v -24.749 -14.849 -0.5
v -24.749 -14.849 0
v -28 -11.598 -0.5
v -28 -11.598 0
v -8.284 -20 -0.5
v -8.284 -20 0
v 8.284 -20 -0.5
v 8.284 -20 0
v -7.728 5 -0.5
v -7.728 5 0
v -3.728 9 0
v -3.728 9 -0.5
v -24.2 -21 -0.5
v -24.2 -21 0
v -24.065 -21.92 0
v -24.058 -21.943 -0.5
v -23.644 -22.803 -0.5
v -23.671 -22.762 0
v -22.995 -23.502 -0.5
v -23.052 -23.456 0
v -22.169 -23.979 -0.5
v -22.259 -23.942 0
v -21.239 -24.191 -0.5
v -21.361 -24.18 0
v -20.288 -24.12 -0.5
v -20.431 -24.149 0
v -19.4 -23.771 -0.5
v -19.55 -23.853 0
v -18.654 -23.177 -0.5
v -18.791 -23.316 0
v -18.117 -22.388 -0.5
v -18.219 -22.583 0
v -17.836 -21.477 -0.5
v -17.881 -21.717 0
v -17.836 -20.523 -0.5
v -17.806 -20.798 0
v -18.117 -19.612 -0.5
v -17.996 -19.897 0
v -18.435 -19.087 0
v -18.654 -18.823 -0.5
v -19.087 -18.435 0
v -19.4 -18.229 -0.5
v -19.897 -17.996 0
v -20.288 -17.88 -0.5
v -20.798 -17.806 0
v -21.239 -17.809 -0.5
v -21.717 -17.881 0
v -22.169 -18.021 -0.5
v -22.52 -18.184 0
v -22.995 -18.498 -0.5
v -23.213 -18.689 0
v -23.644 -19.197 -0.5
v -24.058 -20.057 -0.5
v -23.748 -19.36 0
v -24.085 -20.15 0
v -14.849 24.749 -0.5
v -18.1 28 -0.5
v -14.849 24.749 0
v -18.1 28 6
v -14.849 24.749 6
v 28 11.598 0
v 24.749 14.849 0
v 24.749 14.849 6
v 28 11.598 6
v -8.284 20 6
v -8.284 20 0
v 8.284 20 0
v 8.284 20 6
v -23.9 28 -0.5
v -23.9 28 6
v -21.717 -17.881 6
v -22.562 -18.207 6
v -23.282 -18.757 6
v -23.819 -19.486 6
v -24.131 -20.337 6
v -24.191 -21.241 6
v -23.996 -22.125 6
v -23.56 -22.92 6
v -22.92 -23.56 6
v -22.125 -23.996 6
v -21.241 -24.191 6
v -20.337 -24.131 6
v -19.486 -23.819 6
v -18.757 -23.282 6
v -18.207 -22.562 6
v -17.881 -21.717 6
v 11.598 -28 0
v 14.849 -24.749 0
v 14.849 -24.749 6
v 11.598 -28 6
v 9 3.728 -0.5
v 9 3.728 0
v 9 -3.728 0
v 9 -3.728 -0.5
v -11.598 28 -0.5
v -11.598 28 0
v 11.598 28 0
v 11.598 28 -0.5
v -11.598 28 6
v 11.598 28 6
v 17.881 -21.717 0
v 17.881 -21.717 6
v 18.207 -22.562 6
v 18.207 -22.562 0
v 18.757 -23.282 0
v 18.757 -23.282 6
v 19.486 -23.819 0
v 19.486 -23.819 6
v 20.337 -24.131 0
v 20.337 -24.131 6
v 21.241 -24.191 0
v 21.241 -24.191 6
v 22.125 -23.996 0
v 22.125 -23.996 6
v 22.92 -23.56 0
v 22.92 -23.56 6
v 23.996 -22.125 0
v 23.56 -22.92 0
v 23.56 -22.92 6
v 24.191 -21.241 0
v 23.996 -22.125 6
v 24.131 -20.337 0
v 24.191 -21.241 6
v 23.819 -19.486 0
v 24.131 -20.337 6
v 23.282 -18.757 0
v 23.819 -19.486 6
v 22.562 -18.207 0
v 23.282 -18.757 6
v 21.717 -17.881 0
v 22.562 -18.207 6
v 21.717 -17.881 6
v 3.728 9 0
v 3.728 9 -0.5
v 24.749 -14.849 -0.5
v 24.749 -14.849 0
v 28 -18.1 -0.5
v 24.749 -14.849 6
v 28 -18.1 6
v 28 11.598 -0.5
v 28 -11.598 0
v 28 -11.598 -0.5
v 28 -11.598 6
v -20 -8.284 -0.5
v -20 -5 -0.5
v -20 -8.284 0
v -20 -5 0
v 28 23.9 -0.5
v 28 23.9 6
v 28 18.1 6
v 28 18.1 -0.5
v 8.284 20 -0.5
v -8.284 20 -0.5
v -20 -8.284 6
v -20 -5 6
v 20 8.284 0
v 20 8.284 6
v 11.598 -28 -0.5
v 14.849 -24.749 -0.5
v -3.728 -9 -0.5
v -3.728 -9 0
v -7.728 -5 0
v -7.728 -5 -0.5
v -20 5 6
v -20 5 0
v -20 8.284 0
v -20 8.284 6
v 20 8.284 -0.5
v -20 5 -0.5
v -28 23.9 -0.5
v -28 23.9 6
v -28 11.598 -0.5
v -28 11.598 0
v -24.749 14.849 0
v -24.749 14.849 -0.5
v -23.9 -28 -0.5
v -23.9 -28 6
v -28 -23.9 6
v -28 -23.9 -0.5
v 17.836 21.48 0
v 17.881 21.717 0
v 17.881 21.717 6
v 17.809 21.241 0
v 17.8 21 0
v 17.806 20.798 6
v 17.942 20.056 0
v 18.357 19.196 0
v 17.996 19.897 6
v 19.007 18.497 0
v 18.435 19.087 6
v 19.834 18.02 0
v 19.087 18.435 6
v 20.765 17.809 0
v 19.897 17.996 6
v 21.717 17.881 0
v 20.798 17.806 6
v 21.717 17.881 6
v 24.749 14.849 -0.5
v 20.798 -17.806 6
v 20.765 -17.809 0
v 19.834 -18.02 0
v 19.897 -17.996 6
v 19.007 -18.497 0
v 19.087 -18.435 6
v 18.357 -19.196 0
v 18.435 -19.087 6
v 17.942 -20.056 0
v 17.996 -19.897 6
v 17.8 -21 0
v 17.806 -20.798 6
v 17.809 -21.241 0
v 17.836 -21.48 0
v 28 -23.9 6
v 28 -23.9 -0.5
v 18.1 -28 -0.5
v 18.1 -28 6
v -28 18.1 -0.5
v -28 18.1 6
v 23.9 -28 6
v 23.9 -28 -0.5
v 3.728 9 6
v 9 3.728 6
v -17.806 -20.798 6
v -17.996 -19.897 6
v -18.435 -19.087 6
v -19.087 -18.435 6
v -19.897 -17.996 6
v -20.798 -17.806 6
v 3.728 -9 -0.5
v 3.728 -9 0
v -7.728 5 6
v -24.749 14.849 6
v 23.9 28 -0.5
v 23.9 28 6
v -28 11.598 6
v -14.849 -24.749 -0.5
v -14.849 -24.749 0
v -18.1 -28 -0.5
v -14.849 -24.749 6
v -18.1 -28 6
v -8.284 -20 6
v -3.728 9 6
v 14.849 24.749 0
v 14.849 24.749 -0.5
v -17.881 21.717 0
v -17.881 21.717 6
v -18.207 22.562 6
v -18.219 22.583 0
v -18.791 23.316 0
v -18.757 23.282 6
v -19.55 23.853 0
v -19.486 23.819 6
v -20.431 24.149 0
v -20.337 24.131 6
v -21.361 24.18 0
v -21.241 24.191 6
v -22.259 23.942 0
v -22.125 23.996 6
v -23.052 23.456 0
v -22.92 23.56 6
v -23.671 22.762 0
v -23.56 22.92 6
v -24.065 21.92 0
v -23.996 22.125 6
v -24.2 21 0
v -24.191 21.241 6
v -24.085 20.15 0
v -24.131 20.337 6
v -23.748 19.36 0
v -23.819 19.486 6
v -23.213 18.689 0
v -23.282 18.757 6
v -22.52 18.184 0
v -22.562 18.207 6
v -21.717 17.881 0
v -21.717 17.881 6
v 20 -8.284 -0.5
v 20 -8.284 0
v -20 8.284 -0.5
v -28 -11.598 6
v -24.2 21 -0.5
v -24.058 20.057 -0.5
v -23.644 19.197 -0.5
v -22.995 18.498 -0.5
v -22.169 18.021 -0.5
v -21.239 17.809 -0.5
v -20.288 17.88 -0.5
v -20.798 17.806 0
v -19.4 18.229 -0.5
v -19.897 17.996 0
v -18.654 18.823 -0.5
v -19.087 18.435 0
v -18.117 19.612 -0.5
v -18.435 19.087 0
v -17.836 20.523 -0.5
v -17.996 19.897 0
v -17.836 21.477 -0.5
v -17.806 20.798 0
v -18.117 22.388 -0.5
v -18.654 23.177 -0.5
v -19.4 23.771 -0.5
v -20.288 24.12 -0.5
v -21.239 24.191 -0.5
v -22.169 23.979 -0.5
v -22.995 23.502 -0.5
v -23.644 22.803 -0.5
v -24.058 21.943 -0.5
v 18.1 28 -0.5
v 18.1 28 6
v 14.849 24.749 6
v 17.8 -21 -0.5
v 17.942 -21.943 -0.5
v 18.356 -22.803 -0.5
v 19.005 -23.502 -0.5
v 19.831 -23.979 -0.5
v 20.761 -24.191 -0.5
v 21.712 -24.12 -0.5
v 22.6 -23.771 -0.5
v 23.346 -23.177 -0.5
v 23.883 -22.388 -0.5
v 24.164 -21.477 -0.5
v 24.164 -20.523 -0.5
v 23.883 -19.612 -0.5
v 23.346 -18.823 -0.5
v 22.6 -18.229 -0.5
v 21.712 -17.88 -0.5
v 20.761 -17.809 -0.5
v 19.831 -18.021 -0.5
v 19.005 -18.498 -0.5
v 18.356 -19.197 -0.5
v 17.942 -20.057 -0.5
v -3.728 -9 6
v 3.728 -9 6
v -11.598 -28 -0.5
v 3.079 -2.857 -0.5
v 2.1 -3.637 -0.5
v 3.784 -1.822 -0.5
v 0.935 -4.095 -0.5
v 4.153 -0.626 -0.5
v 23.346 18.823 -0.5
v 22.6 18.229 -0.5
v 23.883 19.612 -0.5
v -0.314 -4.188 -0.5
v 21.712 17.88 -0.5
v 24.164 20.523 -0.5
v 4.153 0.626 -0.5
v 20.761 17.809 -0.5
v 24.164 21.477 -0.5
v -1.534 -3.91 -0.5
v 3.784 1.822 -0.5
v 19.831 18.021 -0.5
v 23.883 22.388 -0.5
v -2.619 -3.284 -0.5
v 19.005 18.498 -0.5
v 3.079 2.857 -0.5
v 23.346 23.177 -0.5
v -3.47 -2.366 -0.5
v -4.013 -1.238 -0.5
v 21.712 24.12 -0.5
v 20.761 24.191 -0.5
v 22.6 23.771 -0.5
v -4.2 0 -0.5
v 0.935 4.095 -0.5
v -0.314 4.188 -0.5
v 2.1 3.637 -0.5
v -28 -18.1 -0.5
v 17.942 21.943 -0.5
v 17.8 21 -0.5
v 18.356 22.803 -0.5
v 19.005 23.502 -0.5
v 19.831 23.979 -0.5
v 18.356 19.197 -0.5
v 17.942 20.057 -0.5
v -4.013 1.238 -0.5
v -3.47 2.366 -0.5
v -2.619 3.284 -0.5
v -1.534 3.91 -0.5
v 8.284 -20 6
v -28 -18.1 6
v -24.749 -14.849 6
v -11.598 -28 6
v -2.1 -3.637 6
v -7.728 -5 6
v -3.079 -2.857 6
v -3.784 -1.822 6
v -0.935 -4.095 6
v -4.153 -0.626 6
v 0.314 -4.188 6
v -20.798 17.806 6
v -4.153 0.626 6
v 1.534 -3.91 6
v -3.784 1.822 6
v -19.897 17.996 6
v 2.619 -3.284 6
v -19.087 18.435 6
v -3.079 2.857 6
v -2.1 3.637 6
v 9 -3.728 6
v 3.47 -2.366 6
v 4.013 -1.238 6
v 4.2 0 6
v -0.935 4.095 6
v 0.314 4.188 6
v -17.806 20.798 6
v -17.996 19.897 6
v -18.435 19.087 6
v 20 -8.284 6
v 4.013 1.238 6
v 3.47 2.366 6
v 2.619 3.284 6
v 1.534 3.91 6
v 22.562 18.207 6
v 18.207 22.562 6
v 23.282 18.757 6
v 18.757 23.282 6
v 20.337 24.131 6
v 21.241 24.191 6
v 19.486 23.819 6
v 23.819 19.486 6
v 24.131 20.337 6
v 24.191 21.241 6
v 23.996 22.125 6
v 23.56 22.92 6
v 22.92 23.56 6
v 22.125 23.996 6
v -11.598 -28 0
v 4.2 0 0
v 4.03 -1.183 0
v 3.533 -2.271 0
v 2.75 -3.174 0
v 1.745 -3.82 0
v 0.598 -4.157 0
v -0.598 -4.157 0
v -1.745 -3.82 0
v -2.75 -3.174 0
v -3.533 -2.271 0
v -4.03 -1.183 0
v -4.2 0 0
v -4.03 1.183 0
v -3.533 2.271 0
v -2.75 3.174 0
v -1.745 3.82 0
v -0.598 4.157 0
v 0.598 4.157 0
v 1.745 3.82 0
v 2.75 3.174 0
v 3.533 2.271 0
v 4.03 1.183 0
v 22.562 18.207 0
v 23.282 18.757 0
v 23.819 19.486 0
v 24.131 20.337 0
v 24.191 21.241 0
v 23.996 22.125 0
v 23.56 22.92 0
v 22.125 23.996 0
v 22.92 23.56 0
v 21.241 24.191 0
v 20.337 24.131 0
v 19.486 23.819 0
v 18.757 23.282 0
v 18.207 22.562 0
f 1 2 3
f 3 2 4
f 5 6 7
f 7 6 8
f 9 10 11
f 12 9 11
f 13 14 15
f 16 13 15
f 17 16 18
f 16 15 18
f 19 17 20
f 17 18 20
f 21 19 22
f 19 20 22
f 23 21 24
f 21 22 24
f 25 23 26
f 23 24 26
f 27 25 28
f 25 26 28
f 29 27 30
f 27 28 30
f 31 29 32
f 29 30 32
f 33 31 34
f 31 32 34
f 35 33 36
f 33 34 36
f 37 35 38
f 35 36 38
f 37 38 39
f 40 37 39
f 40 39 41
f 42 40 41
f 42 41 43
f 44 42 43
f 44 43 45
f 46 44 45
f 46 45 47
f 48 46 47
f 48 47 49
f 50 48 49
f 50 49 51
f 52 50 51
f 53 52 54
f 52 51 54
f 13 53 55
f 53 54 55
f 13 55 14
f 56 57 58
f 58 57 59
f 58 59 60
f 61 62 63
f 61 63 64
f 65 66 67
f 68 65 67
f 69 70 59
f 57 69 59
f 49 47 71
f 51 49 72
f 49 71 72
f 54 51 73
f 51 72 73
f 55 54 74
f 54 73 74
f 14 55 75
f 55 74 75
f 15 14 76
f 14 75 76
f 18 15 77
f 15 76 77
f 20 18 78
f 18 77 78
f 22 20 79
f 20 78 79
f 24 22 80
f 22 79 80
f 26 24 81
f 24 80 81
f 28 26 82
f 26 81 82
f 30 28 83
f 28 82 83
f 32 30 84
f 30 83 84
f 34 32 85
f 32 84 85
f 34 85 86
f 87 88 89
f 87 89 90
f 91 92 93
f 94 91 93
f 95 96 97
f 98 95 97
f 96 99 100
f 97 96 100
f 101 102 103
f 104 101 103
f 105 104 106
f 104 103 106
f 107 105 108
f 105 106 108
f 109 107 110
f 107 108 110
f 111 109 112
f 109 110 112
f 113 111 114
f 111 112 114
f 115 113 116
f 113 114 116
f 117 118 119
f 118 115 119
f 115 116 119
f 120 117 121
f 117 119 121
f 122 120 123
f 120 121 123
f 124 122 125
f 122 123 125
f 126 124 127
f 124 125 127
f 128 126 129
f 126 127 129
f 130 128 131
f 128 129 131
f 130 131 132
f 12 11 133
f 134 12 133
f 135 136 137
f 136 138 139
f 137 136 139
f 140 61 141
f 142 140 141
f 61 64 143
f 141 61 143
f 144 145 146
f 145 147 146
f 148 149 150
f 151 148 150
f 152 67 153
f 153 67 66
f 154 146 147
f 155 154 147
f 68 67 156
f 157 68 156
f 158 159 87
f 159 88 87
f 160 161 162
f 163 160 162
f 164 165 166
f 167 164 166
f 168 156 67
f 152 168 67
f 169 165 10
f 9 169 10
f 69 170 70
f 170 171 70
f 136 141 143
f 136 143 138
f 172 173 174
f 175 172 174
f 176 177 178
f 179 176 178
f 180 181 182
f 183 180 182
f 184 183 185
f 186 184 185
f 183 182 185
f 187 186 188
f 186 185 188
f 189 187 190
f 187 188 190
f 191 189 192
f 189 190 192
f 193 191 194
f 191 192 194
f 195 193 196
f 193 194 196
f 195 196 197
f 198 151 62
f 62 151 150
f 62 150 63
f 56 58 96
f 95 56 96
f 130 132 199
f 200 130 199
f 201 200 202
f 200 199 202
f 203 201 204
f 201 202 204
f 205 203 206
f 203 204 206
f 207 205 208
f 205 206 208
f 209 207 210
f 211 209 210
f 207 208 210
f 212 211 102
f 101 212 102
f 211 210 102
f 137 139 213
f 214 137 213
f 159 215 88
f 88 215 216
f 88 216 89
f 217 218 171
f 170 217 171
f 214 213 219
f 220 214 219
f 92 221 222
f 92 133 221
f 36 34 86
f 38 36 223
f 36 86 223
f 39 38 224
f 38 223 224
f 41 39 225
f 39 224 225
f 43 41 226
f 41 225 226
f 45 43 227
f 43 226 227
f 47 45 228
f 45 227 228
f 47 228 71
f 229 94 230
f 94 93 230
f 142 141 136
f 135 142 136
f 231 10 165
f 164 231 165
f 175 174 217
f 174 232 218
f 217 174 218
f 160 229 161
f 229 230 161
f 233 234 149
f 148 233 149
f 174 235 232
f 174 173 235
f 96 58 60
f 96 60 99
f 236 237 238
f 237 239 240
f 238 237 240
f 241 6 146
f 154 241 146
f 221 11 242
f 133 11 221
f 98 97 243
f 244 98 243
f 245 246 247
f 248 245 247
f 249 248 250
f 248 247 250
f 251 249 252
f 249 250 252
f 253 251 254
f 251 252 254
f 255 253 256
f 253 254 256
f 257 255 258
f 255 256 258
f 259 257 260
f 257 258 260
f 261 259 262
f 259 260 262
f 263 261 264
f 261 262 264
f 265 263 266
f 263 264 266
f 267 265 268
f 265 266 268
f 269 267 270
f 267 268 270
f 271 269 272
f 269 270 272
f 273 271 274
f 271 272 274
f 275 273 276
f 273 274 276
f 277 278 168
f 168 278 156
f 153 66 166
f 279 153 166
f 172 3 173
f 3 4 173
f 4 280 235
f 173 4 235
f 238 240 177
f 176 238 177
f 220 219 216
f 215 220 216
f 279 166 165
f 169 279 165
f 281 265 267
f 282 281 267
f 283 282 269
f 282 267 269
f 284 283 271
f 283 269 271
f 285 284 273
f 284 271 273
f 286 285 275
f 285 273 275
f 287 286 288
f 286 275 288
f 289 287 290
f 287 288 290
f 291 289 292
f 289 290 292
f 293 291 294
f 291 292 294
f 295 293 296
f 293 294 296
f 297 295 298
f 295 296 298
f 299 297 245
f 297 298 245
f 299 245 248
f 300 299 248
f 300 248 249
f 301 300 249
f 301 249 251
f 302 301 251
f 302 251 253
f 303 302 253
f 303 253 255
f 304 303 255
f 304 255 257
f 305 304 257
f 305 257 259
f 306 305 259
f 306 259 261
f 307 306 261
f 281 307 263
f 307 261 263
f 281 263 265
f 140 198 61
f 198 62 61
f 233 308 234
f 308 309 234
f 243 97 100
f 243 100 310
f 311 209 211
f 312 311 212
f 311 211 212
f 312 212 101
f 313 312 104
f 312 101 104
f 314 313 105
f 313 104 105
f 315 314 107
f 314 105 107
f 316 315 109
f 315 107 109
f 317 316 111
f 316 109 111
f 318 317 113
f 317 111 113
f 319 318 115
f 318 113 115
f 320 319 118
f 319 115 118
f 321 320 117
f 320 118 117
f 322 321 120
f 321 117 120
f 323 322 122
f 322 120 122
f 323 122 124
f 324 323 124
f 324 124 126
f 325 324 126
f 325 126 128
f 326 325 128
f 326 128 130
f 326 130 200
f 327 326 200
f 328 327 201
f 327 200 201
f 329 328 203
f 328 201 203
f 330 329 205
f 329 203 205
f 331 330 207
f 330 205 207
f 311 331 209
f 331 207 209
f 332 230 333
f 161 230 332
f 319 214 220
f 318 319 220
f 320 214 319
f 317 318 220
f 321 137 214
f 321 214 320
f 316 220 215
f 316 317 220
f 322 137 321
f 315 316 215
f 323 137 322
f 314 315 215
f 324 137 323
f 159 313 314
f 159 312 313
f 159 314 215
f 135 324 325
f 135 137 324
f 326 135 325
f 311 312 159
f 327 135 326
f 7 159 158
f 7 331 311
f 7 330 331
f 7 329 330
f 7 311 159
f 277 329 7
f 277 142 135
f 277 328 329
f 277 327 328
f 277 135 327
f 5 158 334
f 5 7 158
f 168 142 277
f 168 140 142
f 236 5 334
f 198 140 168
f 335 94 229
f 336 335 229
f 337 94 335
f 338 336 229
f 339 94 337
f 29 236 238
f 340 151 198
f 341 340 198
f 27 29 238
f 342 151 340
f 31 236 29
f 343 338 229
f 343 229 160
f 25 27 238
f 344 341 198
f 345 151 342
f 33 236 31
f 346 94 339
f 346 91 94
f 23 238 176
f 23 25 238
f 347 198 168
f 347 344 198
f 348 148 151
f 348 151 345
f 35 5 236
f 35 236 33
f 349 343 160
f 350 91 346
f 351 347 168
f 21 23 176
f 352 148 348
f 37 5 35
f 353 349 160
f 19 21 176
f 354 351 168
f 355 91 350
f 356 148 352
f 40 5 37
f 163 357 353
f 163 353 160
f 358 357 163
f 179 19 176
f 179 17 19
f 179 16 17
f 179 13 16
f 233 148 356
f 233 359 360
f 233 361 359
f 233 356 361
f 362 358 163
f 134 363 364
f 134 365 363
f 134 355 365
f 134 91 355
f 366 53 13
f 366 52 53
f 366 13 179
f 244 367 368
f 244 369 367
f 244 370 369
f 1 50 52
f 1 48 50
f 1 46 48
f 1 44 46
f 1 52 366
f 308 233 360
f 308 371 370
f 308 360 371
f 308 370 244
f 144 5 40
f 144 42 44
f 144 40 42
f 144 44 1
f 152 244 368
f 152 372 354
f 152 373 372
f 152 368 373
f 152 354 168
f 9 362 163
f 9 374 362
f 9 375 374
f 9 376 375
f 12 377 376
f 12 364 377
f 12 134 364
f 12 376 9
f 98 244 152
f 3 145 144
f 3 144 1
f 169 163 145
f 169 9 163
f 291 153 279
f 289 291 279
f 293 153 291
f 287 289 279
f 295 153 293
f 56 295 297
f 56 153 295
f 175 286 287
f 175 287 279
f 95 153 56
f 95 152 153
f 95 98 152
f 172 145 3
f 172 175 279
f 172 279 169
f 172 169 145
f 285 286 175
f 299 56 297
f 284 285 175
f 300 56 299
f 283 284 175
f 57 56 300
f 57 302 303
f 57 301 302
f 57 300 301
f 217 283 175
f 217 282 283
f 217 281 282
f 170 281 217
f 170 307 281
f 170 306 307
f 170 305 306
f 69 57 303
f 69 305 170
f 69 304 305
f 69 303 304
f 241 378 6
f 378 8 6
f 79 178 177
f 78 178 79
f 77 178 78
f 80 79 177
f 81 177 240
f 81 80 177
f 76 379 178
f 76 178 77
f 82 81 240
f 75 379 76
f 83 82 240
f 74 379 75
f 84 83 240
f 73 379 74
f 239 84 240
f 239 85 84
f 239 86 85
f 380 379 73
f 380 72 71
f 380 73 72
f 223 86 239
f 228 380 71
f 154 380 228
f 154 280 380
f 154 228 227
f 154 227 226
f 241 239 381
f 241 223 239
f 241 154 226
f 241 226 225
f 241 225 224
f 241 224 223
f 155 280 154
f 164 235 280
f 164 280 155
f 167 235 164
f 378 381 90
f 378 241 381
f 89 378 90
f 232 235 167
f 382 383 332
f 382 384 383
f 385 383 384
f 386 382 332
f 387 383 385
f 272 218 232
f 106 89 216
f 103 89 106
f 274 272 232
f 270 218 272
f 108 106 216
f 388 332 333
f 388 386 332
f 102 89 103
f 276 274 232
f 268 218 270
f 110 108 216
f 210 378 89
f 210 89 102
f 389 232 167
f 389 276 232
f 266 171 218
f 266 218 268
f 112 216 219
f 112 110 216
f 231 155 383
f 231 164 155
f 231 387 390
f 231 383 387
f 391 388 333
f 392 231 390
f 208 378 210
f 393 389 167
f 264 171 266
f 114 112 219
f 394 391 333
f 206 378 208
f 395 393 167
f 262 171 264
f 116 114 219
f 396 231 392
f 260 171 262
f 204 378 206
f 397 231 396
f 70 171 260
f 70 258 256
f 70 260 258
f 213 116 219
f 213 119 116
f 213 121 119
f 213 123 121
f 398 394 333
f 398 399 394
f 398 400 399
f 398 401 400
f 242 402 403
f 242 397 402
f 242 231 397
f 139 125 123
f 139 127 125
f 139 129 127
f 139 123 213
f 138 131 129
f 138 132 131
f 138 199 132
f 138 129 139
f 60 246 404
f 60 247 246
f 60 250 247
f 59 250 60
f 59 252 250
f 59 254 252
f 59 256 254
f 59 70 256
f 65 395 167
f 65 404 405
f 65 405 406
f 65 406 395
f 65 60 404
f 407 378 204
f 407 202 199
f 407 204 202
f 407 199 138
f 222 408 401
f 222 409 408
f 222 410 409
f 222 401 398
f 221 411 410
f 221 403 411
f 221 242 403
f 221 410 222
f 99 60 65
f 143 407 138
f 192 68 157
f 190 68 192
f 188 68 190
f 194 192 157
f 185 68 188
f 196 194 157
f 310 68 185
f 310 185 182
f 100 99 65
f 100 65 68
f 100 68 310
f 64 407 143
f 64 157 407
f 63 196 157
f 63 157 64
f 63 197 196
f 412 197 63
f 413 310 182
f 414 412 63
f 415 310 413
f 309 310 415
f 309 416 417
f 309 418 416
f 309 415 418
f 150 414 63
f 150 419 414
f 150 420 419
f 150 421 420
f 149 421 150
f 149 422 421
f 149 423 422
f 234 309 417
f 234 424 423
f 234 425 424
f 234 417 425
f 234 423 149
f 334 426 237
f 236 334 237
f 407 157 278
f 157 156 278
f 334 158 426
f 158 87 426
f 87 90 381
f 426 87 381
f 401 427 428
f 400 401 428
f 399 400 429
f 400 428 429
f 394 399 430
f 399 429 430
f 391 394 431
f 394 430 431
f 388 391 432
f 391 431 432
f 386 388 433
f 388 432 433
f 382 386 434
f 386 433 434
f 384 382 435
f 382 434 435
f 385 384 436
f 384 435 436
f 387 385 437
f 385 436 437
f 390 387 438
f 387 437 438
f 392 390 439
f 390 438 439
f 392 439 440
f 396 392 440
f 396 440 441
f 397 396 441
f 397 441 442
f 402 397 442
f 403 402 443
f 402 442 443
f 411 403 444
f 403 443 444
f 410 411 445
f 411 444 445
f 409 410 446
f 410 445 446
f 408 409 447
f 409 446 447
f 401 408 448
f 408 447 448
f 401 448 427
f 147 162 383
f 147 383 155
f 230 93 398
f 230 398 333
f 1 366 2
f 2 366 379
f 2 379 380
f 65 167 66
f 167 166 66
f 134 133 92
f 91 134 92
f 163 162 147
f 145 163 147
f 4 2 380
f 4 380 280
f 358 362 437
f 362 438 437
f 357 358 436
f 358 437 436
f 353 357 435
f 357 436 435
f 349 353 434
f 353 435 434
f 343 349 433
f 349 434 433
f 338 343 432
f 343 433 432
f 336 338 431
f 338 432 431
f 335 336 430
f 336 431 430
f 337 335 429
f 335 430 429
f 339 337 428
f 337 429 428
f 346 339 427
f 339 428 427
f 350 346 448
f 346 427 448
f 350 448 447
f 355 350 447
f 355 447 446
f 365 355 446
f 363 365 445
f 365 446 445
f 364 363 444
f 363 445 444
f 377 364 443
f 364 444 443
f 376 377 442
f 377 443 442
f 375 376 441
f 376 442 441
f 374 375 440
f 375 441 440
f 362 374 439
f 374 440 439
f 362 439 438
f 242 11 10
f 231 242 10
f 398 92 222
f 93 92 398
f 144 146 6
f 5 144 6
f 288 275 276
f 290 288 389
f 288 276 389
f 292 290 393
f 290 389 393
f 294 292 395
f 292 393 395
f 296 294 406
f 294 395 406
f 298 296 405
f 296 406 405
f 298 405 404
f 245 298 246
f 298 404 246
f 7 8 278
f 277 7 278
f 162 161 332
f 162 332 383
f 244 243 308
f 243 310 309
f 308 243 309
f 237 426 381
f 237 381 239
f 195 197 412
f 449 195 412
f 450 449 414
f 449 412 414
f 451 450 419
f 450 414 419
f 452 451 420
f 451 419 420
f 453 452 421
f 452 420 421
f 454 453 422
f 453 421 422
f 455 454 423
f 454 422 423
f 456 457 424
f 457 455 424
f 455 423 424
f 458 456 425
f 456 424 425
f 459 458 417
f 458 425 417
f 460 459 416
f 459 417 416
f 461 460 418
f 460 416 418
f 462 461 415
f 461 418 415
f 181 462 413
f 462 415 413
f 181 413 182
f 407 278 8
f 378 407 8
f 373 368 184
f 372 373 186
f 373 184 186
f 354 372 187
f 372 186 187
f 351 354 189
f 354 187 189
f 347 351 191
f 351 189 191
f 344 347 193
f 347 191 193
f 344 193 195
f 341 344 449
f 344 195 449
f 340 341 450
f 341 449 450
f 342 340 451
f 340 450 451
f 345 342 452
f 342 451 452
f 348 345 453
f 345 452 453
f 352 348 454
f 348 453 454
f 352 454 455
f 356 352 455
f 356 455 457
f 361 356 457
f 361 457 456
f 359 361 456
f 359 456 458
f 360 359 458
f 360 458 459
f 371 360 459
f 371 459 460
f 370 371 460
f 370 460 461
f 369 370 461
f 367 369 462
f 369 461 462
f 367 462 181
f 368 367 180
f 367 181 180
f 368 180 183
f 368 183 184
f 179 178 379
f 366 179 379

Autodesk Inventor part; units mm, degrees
ref_plane "YZ Plane" through (0, 0, 0) normal (1, 0, 0) x (0, 1, 0)
ref_plane "XZ Plane" through (0, 0, 0) normal (0, 1, 0) x (-1, 0, 0)
ref_plane "XY Plane" through (0, 0, 0) normal (0, 0, 1) x (1, 0, 0)
sketch "Sketch1" plane through (0, 0, 0) normal (0, 0, 1) x (1, 0, 0)
  circle A0 centre (0, 0) radius 8 construction
  circle A1 centre (0, 0) radius 16 construction
  line L0 (20, -8.2843) -> (8.2843, -20)
  line L1 (8.2843, -20) -> (-8.2843, -20)
  line L2 (-8.2843, -20) -> (-20, -8.2843)
  line L3 (-20, 8.2843) -> (-8.2843, 20)
  line L4 (-8.2843, 20) -> (8.2843, 20)
  line L5 (8.2843, 20) -> (20, 8.2843)
  line L6 (20, 8.2843) -> (20, -8.2843)
  line L7 (-7.7279, 5) -> (-20, 5)
  line L8 (-7.7279, -5) -> (-20, -5)
  circle A2 centre (0, 0) radius 4.2
  line L9 (-20, -8.2843) -> (-20, -5)
  line L10 (-20, 5) -> (-20, 8.2843)
  line L11 (28, -11.598) -> (11.598, -28)
  line L12 (11.598, -28) -> (-11.598, -28)
  line L13 (-11.598, -28) -> (-28, -11.598)
  line L14 (-28, -11.598) -> (-28, 11.598)
  line L15 (-28, 11.598) -> (-11.598, 28)
  line L16 (-11.598, 28) -> (11.598, 28)
  line L17 (11.598, 28) -> (28, 11.598)
  line L18 (28, 11.598) -> (28, -11.598)
  line L19 (9, -3.7279) -> (3.7279, -9)
  line L20 (3.7279, -9) -> (-3.7279, -9)
  line L21 (-3.7279, 9) -> (3.7279, 9)
  line L22 (3.7279, 9) -> (9, 3.7279)
  line L23 (9, 3.7279) -> (9, -3.7279)
  line L24 (-20, 5) -> (-20, -5) construction
  line L25 (-3.7279, 9) -> (-7.7279, 5)
  line L26 (-3.7279, -9) -> (-7.7279, -5)
  point P0 (-20, 0)
  dimension "d1" = 16
  dimension "d2" = 32
  dimension "d5" = 8.4
  dimension "d6" = 40
  dimension "d7" = 8
  dimension "d8" = 10
  dimension "d10" = 18
extrude "Extrusion1" add sketch "Sketch1" along normal blind 6
sketch "Sketch2" plane through (0, 0, 6) normal (0, 0, 1) x (1, 0, 0)
  circle A0 centre (0, 0) radius 4.2 projected
  line L0 (11.598, 28) -> (-11.598, 28) projected
  line L1 (-11.598, 28) -> (-28, 11.598) projected
  line L2 (-28, 11.598) -> (-28, -11.598) projected
  line L3 (-28, -11.598) -> (-11.598, -28) projected
  line L4 (-11.598, -28) -> (11.598, -28) projected
  line L5 (-24.7487, 14.8492) -> (-28, 18.1005)
  line L6 (-28, 18.1005) -> (-28, 23.8995)
  line L7 (-28, 23.8995) -> (-23.8995, 28)
  line L8 (-23.8995, 28) -> (-18.1005, 28)
  line L9 (-18.1005, 28) -> (-14.8492, 24.7487)
  line L10 (-28, 21) -> (-21, 21) construction
  line L11 (-21, 28) -> (-21, 21) construction
  circle A1 centre (-21, 21) radius 3.2
  line L12 (-24.7487, 14.8492) -> (-14.8492, 24.7487)
  line L13 (-14.8492, -24.7487) -> (-18.1005, -28)
  line L14 (-18.1005, -28) -> (-23.8995, -28)
  line L15 (-23.8995, -28) -> (-28, -23.8995)
  line L16 (-28, -23.8995) -> (-28, -18.1005)
  line L17 (-28, -18.1005) -> (-24.7487, -14.8492)
  circle A2 centre (-21, -21) radius 3.2
  line L18 (-14.8492, -24.7487) -> (-24.7487, -14.8492)
  line L19 (24.7487, -14.8492) -> (28, -18.1005)
  line L20 (28, -18.1005) -> (28, -23.8995)
  line L21 (28, -23.8995) -> (23.8995, -28)
  line L22 (23.8995, -28) -> (18.1005, -28)
  line L23 (18.1005, -28) -> (14.8492, -24.7487)
  circle A3 centre (21, -21) radius 3.2
  line L24 (24.7487, -14.8492) -> (14.8492, -24.7487)
  line L25 (14.8492, 24.7487) -> (18.1005, 28)
  line L26 (18.1005, 28) -> (23.8995, 28)
  line L27 (23.8995, 28) -> (28, 23.8995)
  line L28 (28, 23.8995) -> (28, 18.1005)
  line L29 (28, 18.1005) -> (24.7487, 14.8492)
  circle A4 centre (21, 21) radius 3.2
  line L30 (14.8492, 24.7487) -> (24.7487, 14.8492)
  circle A5 centre (-21, 21) radius 6 construction
  point P0 (-19.799, 19.799)
  point P1 (-21, -28)
  point P2 (-28, -21)
  point P3 (28, -21)
  point P4 (21, -28)
  point P5 (21, 28)
  point P6 (28, 21)
  dimension "d13" = 14
  dimension "d14" = 7
  dimension "d15" = 6.4
  dimension "d18" = 360
  dimension "d22" = 12
extrude "Extrusion2" add sketch "Sketch2" against normal blind 6 contours L3 A2 L13 L14 L15 L16 L17 | L5 L6 L7 L8 L9 L1 A1 | L19 L20 L21 L22 L23 L24 A3 | L25 L26 L27 L28 L29 L30 A4
sketch "Sketch3" plane through (0, 0, 6) normal (0, 0, 1) x (1, 0, 0)
  line L0 (-17.8813, 21.7167) -> (-21.7167, 17.8813) projected
  arc A0 (-17.8813, 21.7167) -> (-21.7167, 17.8813) centre (-21, 21) ccw projected
  line L1 (-21.7167, -17.8813) -> (-17.8813, -21.7167) projected
  arc A1 (-21.7167, -17.8813) -> (-17.8813, -21.7167) centre (-21, -21) ccw projected
  arc A2 (17.8813, -21.7167) -> (21.7167, -17.8813) centre (21, -21) ccw projected
  line L2 (17.8813, -21.7167) -> (21.7167, -17.8813) projected
  arc A3 (21.7167, 17.8813) -> (17.8813, 21.7167) centre (21, 21) ccw projected
  line L3 (21.7167, 17.8813) -> (17.8813, 21.7167) projected
  circle A4 centre (-21, -21) radius 3.2
  circle A5 centre (-21, 21) radius 3.2
  circle A6 centre (21, 21) radius 3.2
  circle A7 centre (21, -21) radius 3.2
extrude "Extrusion3" cut sketch "Sketch3" against normal through all contours A5 L0 | A4 L1 | A7 L2 | A6 L3
sketch "Sketch4" plane through (0, 0, 0) normal (0, 0, -1) x (-1, 0, 0)
  circle A0 centre (21, -21) radius 3.2 projected
  circle A1 centre (21, 21) radius 3.2 projected
  circle A2 centre (-21, -21) radius 3.2 projected
  line L0 (-24.7487, -14.8492) -> (-28, -18.1005) projected
  line L1 (-28, -18.1005) -> (-28, -23.8995) projected
  line L2 (-28, -23.8995) -> (-23.8995, -28) projected
  line L3 (-23.8995, -28) -> (-18.1005, -28) projected
  line L4 (-18.1005, -28) -> (-14.8492, -24.7487) projected
  line L5 (-14.8492, -24.7487) -> (-11.598, -28) projected
  line L6 (-11.598, -28) -> (11.598, -28) projected
  line L7 (11.598, -28) -> (14.8492, -24.7487) projected
  line L8 (14.8492, -24.7487) -> (18.1005, -28) projected
  line L9 (18.1005, -28) -> (23.8995, -28) projected
  line L10 (23.8995, -28) -> (28, -23.8995) projected
  line L11 (28, -23.8995) -> (28, -18.1005) projected
  line L12 (28, -18.1005) -> (24.7487, -14.8492) projected
  line L13 (24.7487, -14.8492) -> (28, -11.598) projected
  line L14 (28, -11.598) -> (28, 11.598) projected
  line L15 (28, 11.598) -> (24.7487, 14.8492) projected
  line L16 (24.7487, 14.8492) -> (28, 18.1005) projected
  line L17 (28, 18.1005) -> (28, 23.8995) projected
  line L18 (28, 23.8995) -> (23.8995, 28) projected
  line L19 (23.8995, 28) -> (18.1005, 28) projected
  line L20 (18.1005, 28) -> (14.8492, 24.7487) projected
  line L21 (14.8492, 24.7487) -> (11.598, 28) projected
  line L22 (11.598, 28) -> (-11.598, 28) projected
  line L23 (-11.598, 28) -> (-14.8492, 24.7487) projected
  line L24 (-14.8492, 24.7487) -> (-18.1005, 28) projected
  line L25 (-18.1005, 28) -> (-23.8995, 28) projected
  line L26 (-23.8995, 28) -> (-28, 23.8995) projected
  line L27 (-28, 23.8995) -> (-28, 18.1005) projected
  line L28 (-28, 18.1005) -> (-24.7487, 14.8492) projected
  line L29 (-24.7487, 14.8492) -> (-28, 11.598) projected
  line L30 (-28, 11.598) -> (-28, -11.598) projected
  line L31 (-28, -11.598) -> (-24.7487, -14.8492) projected
  circle A3 centre (-21, 21) radius 3.2 projected
  line L32 (8.2843, -20) -> (-8.2843, -20) projected
  line L33 (-8.2843, -20) -> (-20, -8.2843) projected
  line L34 (-20, -8.2843) -> (-20, 8.2843) projected
  line L35 (-20, 8.2843) -> (-8.2843, 20) projected
  line L36 (-8.2843, 20) -> (8.2843, 20) projected
  line L37 (8.2843, 20) -> (20, 8.2843) projected
  line L38 (20, 8.2843) -> (20, 5) projected
  line L39 (20, 5) -> (7.7279, 5) projected
  line L40 (7.7279, 5) -> (3.7279, 9) projected
  line L41 (3.7279, 9) -> (-3.7279, 9) projected
  line L42 (-3.7279, 9) -> (-9, 3.7279) projected
  line L43 (-9, 3.7279) -> (-9, -3.7279) projected
  line L44 (-9, -3.7279) -> (-3.7279, -9) projected
  line L45 (-3.7279, -9) -> (3.7279, -9) projected
  line L46 (3.7279, -9) -> (7.7279, -5) projected
  line L47 (7.7279, -5) -> (20, -5) projected
  line L48 (20, -5) -> (20, -8.2843) projected
  line L49 (20, -8.2843) -> (8.2843, -20) projected
  circle A4 centre (0, 0) radius 4.2 projected
extrude "Extrusion4" add sketch "Sketch4" along normal blind 0.5
properties part number "x_iddler_belt_bearing_mount"
